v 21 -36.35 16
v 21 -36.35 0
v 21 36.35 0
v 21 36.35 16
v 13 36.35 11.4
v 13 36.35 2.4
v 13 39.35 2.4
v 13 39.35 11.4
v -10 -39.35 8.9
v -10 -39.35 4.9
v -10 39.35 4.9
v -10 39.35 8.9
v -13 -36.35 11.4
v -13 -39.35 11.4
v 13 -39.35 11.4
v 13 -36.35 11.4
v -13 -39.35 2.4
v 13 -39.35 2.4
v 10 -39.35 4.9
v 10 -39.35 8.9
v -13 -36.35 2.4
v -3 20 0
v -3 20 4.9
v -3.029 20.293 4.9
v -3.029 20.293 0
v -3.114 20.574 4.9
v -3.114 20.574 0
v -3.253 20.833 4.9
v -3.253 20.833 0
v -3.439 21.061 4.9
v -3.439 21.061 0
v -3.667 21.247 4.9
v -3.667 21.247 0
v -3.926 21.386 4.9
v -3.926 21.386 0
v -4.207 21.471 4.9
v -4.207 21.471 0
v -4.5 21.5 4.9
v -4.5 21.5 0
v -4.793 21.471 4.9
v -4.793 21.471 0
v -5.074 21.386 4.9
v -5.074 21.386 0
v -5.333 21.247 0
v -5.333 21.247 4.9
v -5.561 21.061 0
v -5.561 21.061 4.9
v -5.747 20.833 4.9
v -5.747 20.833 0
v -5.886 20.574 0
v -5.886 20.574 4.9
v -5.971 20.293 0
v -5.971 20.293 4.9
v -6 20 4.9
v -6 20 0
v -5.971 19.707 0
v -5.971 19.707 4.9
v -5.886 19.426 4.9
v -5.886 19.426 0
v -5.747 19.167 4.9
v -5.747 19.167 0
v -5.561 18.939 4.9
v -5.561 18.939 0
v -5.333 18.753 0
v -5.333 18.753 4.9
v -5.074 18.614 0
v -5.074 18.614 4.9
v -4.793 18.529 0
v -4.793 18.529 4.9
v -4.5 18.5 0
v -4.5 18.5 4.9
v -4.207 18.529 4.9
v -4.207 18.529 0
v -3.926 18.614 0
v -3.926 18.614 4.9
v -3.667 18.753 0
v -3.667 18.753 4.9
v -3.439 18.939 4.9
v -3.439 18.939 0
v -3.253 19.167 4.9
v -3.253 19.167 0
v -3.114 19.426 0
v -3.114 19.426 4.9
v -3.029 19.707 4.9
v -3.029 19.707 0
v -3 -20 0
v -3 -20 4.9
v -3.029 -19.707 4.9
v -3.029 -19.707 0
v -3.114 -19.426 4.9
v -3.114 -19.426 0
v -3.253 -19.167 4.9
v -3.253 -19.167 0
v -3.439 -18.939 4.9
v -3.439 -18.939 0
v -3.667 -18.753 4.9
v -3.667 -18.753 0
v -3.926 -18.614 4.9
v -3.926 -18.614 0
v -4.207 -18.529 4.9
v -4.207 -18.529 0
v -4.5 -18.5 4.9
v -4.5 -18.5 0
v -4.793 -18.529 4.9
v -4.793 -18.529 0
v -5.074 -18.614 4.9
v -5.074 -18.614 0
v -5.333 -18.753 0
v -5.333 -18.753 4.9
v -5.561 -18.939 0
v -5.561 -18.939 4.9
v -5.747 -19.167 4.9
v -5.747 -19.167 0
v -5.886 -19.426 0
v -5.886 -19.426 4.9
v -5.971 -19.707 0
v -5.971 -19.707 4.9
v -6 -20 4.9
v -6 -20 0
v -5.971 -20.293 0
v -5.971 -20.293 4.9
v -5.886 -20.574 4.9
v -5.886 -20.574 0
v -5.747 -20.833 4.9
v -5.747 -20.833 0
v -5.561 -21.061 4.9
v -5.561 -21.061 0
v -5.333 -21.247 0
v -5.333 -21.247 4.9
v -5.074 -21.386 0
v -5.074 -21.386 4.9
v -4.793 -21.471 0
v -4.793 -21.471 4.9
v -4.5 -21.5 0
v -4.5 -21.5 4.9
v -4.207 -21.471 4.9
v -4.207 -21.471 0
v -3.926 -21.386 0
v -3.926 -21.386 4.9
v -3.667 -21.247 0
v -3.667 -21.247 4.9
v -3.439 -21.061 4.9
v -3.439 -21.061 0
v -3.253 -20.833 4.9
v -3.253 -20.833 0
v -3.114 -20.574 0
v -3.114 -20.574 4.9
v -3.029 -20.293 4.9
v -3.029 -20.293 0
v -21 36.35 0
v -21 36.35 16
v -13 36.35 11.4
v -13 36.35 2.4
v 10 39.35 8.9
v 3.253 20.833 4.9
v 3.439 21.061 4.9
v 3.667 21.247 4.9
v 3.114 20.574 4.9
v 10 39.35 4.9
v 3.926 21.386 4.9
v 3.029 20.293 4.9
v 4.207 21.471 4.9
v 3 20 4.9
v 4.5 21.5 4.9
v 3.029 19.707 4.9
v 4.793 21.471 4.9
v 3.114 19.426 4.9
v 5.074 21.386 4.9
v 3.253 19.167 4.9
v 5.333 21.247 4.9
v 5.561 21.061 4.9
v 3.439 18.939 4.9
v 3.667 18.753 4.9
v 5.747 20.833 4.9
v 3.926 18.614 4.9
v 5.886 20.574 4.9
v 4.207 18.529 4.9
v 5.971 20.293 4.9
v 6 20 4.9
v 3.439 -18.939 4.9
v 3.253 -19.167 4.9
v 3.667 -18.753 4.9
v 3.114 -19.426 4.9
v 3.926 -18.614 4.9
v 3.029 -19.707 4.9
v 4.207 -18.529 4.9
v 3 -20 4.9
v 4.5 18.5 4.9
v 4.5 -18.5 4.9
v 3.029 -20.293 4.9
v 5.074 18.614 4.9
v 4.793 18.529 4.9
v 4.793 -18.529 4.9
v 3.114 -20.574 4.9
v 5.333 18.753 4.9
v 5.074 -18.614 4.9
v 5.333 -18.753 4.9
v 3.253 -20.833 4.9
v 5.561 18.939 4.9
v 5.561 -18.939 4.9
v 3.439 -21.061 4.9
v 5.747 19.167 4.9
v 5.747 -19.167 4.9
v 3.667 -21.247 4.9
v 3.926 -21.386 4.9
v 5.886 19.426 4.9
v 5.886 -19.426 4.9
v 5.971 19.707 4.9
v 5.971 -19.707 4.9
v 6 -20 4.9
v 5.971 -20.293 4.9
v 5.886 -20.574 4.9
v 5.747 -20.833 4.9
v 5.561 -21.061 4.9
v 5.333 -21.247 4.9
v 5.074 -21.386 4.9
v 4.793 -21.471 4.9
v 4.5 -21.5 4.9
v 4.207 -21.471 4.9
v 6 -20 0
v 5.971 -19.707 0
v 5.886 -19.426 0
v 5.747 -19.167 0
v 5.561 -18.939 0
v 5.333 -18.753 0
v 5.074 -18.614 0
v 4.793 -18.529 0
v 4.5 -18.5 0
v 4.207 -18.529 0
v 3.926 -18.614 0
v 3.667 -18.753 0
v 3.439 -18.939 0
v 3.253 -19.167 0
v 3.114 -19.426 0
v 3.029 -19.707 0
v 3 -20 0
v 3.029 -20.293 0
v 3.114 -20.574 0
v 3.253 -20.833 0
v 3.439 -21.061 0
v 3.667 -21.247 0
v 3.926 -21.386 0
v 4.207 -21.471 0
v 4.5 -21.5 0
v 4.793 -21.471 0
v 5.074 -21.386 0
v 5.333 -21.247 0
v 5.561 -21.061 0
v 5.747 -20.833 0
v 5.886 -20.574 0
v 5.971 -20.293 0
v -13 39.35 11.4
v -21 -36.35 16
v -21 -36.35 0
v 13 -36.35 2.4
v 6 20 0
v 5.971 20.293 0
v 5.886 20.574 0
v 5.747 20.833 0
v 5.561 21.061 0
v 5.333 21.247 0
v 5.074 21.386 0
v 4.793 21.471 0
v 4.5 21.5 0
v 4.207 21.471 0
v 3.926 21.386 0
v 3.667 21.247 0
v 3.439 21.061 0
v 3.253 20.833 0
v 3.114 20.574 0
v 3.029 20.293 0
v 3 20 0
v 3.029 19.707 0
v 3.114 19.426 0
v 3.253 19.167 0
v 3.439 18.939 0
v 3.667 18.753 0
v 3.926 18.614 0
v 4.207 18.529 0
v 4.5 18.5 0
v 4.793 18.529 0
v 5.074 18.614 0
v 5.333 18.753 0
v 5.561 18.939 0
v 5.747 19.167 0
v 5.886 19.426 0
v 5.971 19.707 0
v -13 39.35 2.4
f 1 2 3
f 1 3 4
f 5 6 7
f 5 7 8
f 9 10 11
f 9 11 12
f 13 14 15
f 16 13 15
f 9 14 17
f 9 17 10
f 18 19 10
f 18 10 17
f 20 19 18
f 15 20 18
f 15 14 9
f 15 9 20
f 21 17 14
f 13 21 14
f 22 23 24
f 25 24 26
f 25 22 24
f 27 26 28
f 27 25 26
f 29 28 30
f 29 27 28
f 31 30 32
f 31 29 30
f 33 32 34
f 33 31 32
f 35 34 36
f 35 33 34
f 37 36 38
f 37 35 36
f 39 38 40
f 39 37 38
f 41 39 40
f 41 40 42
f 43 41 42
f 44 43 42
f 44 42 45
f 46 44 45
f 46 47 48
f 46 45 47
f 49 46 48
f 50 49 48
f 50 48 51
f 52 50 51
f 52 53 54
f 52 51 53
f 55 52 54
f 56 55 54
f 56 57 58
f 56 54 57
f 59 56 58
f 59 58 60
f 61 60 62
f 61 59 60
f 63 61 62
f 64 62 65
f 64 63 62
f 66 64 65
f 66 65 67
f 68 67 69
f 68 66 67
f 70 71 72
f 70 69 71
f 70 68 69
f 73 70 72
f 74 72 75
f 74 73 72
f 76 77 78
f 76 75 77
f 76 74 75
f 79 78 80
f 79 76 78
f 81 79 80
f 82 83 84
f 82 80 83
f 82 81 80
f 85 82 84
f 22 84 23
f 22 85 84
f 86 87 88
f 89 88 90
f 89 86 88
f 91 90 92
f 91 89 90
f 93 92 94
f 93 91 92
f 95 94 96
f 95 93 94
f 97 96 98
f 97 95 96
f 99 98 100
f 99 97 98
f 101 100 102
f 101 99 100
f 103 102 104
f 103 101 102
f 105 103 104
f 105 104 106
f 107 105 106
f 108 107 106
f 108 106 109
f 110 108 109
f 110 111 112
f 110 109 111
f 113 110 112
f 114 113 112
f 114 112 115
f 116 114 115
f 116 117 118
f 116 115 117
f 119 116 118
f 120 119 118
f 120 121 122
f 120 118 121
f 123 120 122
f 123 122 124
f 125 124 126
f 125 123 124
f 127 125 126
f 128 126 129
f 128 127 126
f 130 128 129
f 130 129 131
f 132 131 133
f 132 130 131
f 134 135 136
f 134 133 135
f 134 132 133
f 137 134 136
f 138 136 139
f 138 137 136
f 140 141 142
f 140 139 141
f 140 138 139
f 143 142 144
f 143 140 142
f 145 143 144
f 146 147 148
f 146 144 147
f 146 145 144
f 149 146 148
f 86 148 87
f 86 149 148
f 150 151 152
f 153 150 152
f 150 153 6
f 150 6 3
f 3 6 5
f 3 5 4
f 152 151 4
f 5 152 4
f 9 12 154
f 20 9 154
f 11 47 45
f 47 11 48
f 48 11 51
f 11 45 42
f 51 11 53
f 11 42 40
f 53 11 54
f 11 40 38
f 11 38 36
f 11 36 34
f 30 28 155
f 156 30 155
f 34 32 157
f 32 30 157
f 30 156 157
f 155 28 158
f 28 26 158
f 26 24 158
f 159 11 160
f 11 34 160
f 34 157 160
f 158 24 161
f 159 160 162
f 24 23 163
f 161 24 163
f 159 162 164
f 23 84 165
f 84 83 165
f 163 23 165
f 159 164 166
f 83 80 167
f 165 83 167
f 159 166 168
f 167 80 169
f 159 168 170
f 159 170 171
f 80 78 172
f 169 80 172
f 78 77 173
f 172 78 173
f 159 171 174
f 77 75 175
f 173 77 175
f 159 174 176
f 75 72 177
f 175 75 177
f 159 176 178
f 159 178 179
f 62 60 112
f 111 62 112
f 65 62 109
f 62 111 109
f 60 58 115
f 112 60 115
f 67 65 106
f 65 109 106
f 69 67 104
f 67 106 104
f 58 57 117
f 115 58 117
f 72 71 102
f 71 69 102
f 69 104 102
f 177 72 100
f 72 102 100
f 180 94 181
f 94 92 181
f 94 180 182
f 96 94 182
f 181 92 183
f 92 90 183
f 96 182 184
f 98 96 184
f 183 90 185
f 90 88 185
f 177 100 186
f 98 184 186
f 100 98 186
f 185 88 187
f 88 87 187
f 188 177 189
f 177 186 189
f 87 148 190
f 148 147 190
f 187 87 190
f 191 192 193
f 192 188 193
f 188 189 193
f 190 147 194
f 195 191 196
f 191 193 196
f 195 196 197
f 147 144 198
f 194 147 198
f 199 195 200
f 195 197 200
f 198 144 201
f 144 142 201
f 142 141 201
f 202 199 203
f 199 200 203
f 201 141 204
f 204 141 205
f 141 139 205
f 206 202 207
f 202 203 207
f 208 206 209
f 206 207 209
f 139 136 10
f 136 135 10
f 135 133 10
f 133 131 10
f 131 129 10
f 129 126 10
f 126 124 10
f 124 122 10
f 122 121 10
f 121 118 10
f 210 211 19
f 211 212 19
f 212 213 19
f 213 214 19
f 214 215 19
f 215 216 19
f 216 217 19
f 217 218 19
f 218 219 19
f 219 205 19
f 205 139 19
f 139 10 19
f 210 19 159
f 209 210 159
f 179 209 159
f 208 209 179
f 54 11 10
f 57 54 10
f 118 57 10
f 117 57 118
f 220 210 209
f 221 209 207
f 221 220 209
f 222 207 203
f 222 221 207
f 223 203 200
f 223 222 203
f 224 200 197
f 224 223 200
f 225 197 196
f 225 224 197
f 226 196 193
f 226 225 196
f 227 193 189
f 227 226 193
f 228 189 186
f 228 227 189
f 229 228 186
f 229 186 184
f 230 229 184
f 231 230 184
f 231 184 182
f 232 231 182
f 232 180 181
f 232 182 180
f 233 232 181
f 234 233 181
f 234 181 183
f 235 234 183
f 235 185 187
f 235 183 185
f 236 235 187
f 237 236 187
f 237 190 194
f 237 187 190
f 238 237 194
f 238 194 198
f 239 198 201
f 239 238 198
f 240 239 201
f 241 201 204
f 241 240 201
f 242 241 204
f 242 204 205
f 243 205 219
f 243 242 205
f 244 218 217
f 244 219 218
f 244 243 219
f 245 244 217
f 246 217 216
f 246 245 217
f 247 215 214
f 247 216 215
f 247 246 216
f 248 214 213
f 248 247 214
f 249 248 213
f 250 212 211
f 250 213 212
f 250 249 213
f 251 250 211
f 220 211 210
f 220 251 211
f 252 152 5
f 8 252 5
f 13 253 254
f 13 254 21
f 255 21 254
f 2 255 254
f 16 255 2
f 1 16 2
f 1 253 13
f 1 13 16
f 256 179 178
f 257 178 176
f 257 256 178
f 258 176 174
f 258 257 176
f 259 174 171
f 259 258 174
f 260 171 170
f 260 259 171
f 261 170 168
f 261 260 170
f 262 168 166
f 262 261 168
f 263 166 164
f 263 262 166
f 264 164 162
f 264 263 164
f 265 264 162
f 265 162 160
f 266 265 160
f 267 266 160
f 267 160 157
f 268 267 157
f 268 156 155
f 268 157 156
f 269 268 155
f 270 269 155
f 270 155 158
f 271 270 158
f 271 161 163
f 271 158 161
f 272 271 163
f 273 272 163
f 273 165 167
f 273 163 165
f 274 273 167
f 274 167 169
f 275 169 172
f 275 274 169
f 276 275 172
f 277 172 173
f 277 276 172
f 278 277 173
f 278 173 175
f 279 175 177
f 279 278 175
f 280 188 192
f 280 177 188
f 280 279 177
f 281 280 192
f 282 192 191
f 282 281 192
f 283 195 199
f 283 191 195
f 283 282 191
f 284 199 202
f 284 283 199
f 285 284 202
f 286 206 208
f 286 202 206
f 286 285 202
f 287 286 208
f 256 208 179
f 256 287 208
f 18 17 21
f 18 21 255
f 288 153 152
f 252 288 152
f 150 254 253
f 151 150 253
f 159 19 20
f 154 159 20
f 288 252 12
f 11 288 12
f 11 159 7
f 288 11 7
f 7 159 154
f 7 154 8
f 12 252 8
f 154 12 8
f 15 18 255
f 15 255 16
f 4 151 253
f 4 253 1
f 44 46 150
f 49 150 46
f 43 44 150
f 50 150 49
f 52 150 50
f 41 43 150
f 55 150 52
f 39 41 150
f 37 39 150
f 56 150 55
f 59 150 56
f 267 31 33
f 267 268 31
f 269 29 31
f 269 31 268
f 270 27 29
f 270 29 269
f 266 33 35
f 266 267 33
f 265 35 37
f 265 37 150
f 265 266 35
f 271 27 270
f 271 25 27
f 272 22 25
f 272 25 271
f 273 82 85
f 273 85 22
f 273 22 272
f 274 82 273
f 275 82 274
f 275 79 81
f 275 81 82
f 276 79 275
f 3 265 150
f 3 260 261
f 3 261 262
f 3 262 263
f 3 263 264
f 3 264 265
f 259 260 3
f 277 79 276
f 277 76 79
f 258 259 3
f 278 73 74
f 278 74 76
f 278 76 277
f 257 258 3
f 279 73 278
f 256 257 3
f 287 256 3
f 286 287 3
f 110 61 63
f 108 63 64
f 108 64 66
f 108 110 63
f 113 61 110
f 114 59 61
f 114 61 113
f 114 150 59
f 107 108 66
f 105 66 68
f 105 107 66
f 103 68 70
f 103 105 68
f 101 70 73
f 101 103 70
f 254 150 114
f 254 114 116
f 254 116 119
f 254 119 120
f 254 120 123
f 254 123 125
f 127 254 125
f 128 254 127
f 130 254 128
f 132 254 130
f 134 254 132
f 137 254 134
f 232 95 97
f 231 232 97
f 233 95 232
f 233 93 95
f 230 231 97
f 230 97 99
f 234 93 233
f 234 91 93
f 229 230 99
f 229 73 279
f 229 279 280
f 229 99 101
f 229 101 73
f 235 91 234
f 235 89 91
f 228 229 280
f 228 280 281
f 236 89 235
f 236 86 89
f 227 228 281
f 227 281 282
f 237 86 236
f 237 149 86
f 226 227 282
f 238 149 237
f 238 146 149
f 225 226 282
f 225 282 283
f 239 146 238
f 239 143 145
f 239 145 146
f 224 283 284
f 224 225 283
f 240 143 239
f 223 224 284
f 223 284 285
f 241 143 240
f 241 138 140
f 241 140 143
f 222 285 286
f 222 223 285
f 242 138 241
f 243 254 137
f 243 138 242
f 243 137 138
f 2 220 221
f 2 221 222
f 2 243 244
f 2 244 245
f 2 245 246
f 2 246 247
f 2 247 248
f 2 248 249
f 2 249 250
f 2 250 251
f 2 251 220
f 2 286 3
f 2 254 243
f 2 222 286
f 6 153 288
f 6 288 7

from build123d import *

# Parameters (mm, degrees)
SKETCH_W          = 42
SKETCH_H          = 16
PAD_DEPTH         = 36.35
SKETCH001_W       = 26
SKETCH001_H       = 9
PAD001_DEPTH      = 39.35
SKETCH002_W       = 20
SKETCH002_H       = 4
POCKET_DEPTH      = 39.351
POCKET_DEPTH_BACK = -39.351
SKETCH003_R       = 1.5
POCKET001_DEPTH   = 5


with BuildPart() as part:
    # Sketch → Pad (new body, symmetric)
    with BuildSketch(Plane.XZ):
        with Locations((0, 8)):
            Rectangle(SKETCH_W, SKETCH_H)
    extrude(amount=PAD_DEPTH, both=True)

    # Sketch001 → Pad001 (join, symmetric)
    with BuildSketch(Plane.XZ):
        with Locations((0, 6.9)):
            Rectangle(SKETCH001_W, SKETCH001_H)
    extrude(amount=PAD001_DEPTH, both=True)

    # Sketch002 → Pocket (cut, two sides)
    with BuildSketch(Plane.XZ) as pocket_sk:
        with Locations((0, 6.9)):
            Rectangle(SKETCH002_W, SKETCH002_H)
    extrude(amount=-POCKET_DEPTH, mode=Mode.SUBTRACT)
    extrude(pocket_sk.sketch, amount=-POCKET_DEPTH_BACK, mode=Mode.SUBTRACT)

    # Sketch003 → Pocket001 (cut)
    with BuildSketch(Plane.XY):
        with Locations((-4.5, 20)):
            Circle(SKETCH003_R)
        with Locations((4.5, 20)):
            Circle(SKETCH003_R)
        with Locations((-4.5, -20)):
            Circle(SKETCH003_R)
        with Locations((4.5, -20)):
            Circle(SKETCH003_R)
    extrude(amount=POCKET001_DEPTH, mode=Mode.SUBTRACT)


solid = part.part
